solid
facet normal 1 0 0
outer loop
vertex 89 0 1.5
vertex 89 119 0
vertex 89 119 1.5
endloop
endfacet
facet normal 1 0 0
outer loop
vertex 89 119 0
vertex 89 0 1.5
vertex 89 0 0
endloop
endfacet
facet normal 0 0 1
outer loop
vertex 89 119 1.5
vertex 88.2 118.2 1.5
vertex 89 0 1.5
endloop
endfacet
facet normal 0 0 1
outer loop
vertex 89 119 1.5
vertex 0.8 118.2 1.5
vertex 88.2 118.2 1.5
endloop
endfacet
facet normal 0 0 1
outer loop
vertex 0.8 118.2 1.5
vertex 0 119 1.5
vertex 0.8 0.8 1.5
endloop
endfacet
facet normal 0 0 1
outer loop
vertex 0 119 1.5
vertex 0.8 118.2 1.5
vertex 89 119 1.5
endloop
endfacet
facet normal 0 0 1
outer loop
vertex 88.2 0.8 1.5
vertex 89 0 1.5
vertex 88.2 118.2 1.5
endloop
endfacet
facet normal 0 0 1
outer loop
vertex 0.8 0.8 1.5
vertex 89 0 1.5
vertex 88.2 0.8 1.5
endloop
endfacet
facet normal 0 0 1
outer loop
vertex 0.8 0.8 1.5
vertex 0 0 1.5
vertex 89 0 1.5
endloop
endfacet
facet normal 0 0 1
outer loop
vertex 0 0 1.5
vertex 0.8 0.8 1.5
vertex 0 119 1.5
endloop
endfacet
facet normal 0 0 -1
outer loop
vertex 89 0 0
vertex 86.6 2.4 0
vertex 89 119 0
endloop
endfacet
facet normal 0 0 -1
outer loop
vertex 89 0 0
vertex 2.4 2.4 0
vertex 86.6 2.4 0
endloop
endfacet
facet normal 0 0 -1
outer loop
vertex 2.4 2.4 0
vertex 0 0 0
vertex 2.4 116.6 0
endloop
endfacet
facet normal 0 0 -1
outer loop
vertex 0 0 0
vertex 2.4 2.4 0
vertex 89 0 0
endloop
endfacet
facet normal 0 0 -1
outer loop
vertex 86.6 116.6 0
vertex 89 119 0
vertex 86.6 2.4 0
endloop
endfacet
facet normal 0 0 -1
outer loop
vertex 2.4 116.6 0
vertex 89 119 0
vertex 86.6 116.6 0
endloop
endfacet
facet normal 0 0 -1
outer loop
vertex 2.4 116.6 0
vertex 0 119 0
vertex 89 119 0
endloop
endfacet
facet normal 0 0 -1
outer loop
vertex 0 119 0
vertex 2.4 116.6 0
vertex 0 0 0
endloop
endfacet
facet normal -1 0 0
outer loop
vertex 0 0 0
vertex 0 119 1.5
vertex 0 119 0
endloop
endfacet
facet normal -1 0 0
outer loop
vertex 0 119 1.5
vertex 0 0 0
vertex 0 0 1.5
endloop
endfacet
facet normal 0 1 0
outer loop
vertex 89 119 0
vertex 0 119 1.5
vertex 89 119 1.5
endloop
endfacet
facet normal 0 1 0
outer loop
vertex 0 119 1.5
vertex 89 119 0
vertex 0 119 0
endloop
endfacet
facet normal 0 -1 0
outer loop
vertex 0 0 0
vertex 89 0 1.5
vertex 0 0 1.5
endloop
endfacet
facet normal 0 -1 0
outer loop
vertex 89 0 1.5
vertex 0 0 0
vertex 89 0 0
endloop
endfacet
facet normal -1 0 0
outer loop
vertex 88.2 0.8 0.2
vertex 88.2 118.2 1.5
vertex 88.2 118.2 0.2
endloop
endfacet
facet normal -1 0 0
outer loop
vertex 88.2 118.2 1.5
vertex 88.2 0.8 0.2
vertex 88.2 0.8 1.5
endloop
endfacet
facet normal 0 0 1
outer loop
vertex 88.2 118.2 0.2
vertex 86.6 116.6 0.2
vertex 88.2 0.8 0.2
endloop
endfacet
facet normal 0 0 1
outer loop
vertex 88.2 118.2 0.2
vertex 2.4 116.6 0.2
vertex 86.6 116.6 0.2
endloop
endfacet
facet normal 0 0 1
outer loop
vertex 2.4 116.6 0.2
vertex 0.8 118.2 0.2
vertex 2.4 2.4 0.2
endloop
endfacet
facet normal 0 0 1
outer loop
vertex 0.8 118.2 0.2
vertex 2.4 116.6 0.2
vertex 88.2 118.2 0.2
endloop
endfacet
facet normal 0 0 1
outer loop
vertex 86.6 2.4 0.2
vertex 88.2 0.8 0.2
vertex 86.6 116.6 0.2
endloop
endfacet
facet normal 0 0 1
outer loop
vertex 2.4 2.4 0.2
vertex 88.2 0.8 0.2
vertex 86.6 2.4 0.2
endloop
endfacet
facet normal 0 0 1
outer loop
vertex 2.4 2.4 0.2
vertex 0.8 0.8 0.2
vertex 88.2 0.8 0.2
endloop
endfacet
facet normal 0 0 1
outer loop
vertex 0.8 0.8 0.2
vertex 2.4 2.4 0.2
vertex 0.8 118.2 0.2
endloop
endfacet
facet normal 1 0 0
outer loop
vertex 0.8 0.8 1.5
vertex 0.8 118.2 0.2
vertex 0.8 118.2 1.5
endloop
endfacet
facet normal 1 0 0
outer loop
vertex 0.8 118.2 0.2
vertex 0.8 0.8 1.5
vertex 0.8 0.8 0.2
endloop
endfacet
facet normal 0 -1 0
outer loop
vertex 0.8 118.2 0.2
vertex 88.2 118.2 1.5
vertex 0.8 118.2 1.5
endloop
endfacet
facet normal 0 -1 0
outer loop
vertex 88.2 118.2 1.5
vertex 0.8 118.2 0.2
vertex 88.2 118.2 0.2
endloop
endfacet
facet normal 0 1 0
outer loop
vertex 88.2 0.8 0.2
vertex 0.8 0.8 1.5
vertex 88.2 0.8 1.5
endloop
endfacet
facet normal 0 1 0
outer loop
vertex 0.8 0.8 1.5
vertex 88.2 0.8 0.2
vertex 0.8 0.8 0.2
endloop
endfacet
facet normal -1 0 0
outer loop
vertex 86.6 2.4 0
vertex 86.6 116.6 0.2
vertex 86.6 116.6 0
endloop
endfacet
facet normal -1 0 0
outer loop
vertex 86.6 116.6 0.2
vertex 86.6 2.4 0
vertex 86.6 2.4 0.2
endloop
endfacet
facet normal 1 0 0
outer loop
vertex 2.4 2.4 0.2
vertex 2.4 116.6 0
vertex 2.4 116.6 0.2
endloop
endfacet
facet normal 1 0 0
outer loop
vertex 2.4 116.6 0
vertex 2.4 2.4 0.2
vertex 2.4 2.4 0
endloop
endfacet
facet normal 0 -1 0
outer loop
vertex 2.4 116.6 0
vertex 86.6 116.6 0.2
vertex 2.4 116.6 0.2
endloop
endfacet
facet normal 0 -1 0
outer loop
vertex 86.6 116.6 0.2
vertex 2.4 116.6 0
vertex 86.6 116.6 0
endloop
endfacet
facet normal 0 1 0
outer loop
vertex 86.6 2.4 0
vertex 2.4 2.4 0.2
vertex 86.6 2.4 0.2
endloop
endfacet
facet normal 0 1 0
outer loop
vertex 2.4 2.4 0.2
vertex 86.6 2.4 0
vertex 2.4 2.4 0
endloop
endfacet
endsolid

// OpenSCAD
//Frame for using plain film or photopaper in glass plate camera
//Supposed to be supported from the other side with some smaller sized plate
width=89;
height=119;
depth=1.5;
thickness=0.2;
wall=0.8;
border=1.6;
air=0.5;
difference() {
  cube([width,height,depth]);
  translate([wall,wall,thickness]) cube([width-2*wall,height-2*wall,depth]);
  translate([wall+border,wall+border,-0.01]) cube([width-2*wall-2*border,height-2*wall-2*border,depth]);
}
*cube([width-2*wall-2*air,height-2*wall-air*2,depth]); //this can be the plate
